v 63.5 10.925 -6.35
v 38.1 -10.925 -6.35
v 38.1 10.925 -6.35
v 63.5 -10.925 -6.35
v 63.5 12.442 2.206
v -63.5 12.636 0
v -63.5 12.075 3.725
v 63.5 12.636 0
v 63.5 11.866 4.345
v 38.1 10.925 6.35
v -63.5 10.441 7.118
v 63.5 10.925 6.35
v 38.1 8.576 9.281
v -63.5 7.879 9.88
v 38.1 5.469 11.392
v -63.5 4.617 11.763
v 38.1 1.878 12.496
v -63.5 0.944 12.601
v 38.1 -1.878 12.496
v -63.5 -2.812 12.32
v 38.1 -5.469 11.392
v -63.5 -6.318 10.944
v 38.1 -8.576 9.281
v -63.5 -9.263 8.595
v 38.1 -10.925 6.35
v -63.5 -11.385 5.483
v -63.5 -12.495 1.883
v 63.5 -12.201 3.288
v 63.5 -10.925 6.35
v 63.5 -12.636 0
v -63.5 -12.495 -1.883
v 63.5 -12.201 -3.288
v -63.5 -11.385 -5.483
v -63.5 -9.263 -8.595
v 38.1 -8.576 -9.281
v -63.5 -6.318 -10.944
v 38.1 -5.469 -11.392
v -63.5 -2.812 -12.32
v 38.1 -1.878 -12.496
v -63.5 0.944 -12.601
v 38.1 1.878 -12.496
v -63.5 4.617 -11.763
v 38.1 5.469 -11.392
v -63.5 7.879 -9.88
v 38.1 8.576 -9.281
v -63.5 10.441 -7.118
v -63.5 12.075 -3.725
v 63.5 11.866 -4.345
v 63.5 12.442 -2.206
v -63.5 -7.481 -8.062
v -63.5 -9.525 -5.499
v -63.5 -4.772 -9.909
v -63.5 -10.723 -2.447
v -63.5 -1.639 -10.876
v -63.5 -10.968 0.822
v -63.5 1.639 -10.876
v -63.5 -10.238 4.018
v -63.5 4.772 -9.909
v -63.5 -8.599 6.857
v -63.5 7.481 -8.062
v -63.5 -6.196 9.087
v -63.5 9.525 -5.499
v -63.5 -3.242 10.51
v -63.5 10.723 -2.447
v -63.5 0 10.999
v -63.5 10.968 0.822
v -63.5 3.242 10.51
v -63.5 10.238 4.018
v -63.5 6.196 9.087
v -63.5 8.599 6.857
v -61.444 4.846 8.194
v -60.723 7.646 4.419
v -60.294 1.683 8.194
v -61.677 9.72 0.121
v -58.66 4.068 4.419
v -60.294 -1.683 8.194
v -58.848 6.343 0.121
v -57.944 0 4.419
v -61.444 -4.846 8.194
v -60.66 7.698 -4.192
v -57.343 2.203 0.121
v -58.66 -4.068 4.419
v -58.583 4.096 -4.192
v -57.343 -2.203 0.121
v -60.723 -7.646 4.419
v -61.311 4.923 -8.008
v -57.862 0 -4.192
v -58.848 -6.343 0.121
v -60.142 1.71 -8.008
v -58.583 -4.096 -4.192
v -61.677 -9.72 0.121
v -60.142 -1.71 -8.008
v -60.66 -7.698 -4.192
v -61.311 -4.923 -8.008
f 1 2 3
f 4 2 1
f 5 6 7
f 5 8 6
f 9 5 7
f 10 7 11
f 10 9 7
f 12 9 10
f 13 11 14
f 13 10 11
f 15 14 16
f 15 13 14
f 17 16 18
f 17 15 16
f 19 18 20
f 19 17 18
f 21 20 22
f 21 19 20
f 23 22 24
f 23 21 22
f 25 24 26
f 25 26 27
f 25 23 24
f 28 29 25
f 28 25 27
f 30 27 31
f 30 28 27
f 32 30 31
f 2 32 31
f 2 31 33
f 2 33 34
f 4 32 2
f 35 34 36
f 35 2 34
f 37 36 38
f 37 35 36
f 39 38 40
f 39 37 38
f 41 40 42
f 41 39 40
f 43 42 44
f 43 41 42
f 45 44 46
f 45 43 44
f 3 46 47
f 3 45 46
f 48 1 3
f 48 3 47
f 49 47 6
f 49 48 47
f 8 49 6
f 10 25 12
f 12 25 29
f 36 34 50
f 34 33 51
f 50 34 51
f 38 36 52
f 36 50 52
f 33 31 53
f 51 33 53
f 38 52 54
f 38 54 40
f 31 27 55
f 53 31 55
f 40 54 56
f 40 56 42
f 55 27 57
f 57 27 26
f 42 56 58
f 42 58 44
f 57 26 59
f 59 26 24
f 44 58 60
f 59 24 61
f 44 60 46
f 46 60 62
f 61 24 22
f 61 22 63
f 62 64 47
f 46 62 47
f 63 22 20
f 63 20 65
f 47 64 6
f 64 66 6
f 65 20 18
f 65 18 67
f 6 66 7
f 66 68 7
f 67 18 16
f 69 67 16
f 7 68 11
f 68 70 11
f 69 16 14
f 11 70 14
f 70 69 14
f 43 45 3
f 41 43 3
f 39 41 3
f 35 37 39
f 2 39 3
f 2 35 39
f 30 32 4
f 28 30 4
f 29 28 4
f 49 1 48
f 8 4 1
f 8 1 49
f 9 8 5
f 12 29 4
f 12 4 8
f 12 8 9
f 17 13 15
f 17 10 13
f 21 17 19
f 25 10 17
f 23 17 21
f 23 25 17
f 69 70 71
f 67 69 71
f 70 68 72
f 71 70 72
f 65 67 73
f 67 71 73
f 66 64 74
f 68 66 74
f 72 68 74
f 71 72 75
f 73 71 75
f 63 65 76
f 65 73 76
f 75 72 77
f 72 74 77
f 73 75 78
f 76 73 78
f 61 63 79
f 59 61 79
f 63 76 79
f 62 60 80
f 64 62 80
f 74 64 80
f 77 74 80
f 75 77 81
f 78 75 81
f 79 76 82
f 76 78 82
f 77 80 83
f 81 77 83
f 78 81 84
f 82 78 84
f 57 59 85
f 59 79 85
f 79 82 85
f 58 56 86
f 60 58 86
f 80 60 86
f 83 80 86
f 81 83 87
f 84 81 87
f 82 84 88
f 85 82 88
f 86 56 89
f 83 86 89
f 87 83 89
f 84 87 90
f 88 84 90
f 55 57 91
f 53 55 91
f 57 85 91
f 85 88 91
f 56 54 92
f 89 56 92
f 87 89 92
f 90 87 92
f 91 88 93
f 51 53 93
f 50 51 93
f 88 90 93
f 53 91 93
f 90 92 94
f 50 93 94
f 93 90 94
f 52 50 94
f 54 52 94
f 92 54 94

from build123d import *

# Parameters (mm, degrees)
F0_R     = 12.6365
F1_DEPTH = 63.5
F2_W     = 25.4
F2_H     = 6.2865
F3_DEPTH = 12.7
F4_W     = 25.4
F4_H     = 6.2865
F5_DEPTH = 12.7


with BuildPart() as f1:
    # F0 (on Right) → F1 (new body, symmetric)
    with BuildSketch(Plane.YZ):
        Circle(F0_R)
    extrude(amount=F1_DEPTH, both=True)

    # F2 (on Front) → F3 (cut, symmetric)
    with BuildSketch(Plane.XZ):
        with Locations((50.8, 9.49325)):
            Rectangle(F2_W, F2_H)
    extrude(amount=F3_DEPTH, both=True, mode=Mode.SUBTRACT)

    # F4 (on Front) → F5 (cut, symmetric)
    with BuildSketch(Plane.XZ):
        with Locations((50.8, -9.49325)):
            Rectangle(F4_W, F4_H)
    extrude(amount=F5_DEPTH, both=True, mode=Mode.SUBTRACT)

    # F6 (on Front) → F7 (revolve, cut)
    with BuildSketch(Plane.XZ):
        with BuildLine():
            Line((-69.85, -12.7), (-69.85, 12.7))
            ThreePointArc((-69.85, 12.7), (-82.55, 0), (-69.85, -12.7))
        make_face()
    revolve(axis=Axis((-69.85, 0, 0), (0, 0, -1)), mode=Mode.SUBTRACT)


solid = f1.part
